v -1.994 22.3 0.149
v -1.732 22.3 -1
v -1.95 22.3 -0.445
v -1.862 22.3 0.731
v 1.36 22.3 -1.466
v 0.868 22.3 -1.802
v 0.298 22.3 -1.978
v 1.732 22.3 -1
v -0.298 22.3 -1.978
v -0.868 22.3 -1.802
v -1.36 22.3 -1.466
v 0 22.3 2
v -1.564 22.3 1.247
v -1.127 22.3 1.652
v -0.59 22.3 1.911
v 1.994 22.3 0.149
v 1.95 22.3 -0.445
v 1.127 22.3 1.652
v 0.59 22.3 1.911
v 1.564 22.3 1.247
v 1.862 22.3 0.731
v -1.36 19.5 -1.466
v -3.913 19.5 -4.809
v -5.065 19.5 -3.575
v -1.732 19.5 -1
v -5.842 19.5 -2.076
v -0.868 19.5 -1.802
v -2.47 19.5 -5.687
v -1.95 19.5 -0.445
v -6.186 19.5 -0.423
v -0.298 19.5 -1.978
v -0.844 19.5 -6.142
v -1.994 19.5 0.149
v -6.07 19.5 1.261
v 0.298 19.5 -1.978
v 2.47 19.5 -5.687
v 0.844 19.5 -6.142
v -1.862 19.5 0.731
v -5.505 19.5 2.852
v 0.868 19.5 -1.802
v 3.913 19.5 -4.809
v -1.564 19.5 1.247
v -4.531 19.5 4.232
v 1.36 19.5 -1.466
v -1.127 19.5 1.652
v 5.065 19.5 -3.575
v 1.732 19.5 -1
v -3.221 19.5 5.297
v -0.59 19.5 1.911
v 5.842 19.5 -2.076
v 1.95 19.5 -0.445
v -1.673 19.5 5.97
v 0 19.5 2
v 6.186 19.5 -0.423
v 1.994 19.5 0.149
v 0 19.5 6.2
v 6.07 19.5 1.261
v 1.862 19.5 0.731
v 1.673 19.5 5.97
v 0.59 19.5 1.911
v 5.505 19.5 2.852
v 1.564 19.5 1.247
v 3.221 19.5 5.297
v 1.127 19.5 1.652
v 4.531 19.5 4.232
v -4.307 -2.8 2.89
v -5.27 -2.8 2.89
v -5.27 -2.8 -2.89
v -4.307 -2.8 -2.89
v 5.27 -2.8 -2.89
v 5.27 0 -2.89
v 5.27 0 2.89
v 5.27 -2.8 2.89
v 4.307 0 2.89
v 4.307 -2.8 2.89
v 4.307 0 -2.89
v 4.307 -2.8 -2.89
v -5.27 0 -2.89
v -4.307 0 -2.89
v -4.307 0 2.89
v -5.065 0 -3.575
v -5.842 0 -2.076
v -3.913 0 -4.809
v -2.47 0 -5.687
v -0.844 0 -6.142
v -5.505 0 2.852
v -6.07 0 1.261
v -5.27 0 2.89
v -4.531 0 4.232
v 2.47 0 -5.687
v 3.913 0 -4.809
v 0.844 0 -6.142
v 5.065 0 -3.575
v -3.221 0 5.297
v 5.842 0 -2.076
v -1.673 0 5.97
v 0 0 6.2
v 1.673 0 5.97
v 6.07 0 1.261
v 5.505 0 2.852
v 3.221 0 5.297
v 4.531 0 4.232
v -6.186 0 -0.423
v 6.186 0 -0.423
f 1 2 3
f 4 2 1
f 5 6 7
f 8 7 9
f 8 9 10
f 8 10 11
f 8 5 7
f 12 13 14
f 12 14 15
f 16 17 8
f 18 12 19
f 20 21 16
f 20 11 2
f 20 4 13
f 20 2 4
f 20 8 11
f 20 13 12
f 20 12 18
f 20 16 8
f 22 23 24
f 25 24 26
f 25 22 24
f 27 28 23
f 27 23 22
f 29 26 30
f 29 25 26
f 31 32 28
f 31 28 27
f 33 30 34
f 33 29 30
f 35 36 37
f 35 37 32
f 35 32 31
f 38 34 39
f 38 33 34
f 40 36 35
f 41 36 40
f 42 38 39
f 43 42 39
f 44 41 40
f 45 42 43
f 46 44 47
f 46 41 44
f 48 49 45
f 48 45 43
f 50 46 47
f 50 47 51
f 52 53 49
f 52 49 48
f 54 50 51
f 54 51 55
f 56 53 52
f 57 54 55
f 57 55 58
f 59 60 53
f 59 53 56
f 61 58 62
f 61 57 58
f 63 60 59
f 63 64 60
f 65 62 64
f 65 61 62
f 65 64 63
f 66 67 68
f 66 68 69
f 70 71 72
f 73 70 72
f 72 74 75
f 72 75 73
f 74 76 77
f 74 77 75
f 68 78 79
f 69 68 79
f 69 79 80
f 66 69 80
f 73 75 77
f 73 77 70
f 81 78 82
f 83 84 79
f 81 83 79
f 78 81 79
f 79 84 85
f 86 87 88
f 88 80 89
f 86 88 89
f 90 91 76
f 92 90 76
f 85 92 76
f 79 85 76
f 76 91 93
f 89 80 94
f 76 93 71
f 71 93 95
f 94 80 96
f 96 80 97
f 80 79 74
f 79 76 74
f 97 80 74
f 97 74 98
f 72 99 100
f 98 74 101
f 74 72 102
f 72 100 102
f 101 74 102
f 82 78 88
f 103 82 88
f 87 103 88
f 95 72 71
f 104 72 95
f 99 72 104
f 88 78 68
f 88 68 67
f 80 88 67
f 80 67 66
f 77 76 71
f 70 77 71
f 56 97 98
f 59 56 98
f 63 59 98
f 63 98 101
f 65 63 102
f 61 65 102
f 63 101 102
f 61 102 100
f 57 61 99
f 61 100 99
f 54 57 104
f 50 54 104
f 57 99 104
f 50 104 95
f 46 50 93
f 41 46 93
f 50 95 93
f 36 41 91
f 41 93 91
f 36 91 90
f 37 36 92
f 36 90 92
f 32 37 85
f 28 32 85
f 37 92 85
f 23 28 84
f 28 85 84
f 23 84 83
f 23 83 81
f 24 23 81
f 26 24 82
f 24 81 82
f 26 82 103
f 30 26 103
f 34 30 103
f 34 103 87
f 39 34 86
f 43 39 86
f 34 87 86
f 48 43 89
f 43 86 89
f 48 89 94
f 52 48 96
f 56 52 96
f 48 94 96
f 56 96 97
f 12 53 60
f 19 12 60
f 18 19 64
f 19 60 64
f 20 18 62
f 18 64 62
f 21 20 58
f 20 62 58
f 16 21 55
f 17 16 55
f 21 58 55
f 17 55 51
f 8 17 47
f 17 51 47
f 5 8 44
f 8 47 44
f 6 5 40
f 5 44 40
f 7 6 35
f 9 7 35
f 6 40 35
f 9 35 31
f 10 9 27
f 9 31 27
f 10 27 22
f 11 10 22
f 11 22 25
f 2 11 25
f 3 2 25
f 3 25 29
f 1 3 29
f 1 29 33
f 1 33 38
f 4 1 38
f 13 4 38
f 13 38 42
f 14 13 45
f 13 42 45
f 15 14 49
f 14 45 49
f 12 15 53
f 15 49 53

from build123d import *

# Parameters (mm, degrees)
SKETCH1_R           = 6.2
BOSS_EXTRUDE1_DEPTH = 19.5
SKETCH2_R           = 2
BOSS_EXTRUDE2_DEPTH = 2.8
SKETCH3_W           = 0.9633
SKETCH3_H           = 5.7798
BOSS_EXTRUDE3_DEPTH = 2.8


with BuildPart() as part:
    # Sketch1 → Boss-Extrude1 (new body)
    with BuildSketch(Plane(origin=(0, 0, 0), x_dir=(1, 0, 0), z_dir=(0, 1, 0))):
        with Locations(Location((0, 0, 0), (0, 0, 270))):
            Circle(SKETCH1_R)
    extrude(amount=BOSS_EXTRUDE1_DEPTH)

    # Sketch2 → Boss-Extrude2 (add)
    with BuildSketch(Plane(origin=(0, 19.5, 0), x_dir=(1, 0, 0), z_dir=(0, 1, 0))):
        with Locations(Location((0, 0, 0), (0, 0, 270))):
            Circle(SKETCH2_R)
    extrude(amount=BOSS_EXTRUDE2_DEPTH)

    # Sketch3 → Boss-Extrude3 (add)
    with BuildSketch(Plane.XZ):
        with Locations((4.78885, 0)):
            Rectangle(SKETCH3_W, SKETCH3_H)
        with Locations((-4.78885, 0)):
            Rectangle(SKETCH3_W, SKETCH3_H)
    extrude(amount=BOSS_EXTRUDE3_DEPTH)


solid = part.part
